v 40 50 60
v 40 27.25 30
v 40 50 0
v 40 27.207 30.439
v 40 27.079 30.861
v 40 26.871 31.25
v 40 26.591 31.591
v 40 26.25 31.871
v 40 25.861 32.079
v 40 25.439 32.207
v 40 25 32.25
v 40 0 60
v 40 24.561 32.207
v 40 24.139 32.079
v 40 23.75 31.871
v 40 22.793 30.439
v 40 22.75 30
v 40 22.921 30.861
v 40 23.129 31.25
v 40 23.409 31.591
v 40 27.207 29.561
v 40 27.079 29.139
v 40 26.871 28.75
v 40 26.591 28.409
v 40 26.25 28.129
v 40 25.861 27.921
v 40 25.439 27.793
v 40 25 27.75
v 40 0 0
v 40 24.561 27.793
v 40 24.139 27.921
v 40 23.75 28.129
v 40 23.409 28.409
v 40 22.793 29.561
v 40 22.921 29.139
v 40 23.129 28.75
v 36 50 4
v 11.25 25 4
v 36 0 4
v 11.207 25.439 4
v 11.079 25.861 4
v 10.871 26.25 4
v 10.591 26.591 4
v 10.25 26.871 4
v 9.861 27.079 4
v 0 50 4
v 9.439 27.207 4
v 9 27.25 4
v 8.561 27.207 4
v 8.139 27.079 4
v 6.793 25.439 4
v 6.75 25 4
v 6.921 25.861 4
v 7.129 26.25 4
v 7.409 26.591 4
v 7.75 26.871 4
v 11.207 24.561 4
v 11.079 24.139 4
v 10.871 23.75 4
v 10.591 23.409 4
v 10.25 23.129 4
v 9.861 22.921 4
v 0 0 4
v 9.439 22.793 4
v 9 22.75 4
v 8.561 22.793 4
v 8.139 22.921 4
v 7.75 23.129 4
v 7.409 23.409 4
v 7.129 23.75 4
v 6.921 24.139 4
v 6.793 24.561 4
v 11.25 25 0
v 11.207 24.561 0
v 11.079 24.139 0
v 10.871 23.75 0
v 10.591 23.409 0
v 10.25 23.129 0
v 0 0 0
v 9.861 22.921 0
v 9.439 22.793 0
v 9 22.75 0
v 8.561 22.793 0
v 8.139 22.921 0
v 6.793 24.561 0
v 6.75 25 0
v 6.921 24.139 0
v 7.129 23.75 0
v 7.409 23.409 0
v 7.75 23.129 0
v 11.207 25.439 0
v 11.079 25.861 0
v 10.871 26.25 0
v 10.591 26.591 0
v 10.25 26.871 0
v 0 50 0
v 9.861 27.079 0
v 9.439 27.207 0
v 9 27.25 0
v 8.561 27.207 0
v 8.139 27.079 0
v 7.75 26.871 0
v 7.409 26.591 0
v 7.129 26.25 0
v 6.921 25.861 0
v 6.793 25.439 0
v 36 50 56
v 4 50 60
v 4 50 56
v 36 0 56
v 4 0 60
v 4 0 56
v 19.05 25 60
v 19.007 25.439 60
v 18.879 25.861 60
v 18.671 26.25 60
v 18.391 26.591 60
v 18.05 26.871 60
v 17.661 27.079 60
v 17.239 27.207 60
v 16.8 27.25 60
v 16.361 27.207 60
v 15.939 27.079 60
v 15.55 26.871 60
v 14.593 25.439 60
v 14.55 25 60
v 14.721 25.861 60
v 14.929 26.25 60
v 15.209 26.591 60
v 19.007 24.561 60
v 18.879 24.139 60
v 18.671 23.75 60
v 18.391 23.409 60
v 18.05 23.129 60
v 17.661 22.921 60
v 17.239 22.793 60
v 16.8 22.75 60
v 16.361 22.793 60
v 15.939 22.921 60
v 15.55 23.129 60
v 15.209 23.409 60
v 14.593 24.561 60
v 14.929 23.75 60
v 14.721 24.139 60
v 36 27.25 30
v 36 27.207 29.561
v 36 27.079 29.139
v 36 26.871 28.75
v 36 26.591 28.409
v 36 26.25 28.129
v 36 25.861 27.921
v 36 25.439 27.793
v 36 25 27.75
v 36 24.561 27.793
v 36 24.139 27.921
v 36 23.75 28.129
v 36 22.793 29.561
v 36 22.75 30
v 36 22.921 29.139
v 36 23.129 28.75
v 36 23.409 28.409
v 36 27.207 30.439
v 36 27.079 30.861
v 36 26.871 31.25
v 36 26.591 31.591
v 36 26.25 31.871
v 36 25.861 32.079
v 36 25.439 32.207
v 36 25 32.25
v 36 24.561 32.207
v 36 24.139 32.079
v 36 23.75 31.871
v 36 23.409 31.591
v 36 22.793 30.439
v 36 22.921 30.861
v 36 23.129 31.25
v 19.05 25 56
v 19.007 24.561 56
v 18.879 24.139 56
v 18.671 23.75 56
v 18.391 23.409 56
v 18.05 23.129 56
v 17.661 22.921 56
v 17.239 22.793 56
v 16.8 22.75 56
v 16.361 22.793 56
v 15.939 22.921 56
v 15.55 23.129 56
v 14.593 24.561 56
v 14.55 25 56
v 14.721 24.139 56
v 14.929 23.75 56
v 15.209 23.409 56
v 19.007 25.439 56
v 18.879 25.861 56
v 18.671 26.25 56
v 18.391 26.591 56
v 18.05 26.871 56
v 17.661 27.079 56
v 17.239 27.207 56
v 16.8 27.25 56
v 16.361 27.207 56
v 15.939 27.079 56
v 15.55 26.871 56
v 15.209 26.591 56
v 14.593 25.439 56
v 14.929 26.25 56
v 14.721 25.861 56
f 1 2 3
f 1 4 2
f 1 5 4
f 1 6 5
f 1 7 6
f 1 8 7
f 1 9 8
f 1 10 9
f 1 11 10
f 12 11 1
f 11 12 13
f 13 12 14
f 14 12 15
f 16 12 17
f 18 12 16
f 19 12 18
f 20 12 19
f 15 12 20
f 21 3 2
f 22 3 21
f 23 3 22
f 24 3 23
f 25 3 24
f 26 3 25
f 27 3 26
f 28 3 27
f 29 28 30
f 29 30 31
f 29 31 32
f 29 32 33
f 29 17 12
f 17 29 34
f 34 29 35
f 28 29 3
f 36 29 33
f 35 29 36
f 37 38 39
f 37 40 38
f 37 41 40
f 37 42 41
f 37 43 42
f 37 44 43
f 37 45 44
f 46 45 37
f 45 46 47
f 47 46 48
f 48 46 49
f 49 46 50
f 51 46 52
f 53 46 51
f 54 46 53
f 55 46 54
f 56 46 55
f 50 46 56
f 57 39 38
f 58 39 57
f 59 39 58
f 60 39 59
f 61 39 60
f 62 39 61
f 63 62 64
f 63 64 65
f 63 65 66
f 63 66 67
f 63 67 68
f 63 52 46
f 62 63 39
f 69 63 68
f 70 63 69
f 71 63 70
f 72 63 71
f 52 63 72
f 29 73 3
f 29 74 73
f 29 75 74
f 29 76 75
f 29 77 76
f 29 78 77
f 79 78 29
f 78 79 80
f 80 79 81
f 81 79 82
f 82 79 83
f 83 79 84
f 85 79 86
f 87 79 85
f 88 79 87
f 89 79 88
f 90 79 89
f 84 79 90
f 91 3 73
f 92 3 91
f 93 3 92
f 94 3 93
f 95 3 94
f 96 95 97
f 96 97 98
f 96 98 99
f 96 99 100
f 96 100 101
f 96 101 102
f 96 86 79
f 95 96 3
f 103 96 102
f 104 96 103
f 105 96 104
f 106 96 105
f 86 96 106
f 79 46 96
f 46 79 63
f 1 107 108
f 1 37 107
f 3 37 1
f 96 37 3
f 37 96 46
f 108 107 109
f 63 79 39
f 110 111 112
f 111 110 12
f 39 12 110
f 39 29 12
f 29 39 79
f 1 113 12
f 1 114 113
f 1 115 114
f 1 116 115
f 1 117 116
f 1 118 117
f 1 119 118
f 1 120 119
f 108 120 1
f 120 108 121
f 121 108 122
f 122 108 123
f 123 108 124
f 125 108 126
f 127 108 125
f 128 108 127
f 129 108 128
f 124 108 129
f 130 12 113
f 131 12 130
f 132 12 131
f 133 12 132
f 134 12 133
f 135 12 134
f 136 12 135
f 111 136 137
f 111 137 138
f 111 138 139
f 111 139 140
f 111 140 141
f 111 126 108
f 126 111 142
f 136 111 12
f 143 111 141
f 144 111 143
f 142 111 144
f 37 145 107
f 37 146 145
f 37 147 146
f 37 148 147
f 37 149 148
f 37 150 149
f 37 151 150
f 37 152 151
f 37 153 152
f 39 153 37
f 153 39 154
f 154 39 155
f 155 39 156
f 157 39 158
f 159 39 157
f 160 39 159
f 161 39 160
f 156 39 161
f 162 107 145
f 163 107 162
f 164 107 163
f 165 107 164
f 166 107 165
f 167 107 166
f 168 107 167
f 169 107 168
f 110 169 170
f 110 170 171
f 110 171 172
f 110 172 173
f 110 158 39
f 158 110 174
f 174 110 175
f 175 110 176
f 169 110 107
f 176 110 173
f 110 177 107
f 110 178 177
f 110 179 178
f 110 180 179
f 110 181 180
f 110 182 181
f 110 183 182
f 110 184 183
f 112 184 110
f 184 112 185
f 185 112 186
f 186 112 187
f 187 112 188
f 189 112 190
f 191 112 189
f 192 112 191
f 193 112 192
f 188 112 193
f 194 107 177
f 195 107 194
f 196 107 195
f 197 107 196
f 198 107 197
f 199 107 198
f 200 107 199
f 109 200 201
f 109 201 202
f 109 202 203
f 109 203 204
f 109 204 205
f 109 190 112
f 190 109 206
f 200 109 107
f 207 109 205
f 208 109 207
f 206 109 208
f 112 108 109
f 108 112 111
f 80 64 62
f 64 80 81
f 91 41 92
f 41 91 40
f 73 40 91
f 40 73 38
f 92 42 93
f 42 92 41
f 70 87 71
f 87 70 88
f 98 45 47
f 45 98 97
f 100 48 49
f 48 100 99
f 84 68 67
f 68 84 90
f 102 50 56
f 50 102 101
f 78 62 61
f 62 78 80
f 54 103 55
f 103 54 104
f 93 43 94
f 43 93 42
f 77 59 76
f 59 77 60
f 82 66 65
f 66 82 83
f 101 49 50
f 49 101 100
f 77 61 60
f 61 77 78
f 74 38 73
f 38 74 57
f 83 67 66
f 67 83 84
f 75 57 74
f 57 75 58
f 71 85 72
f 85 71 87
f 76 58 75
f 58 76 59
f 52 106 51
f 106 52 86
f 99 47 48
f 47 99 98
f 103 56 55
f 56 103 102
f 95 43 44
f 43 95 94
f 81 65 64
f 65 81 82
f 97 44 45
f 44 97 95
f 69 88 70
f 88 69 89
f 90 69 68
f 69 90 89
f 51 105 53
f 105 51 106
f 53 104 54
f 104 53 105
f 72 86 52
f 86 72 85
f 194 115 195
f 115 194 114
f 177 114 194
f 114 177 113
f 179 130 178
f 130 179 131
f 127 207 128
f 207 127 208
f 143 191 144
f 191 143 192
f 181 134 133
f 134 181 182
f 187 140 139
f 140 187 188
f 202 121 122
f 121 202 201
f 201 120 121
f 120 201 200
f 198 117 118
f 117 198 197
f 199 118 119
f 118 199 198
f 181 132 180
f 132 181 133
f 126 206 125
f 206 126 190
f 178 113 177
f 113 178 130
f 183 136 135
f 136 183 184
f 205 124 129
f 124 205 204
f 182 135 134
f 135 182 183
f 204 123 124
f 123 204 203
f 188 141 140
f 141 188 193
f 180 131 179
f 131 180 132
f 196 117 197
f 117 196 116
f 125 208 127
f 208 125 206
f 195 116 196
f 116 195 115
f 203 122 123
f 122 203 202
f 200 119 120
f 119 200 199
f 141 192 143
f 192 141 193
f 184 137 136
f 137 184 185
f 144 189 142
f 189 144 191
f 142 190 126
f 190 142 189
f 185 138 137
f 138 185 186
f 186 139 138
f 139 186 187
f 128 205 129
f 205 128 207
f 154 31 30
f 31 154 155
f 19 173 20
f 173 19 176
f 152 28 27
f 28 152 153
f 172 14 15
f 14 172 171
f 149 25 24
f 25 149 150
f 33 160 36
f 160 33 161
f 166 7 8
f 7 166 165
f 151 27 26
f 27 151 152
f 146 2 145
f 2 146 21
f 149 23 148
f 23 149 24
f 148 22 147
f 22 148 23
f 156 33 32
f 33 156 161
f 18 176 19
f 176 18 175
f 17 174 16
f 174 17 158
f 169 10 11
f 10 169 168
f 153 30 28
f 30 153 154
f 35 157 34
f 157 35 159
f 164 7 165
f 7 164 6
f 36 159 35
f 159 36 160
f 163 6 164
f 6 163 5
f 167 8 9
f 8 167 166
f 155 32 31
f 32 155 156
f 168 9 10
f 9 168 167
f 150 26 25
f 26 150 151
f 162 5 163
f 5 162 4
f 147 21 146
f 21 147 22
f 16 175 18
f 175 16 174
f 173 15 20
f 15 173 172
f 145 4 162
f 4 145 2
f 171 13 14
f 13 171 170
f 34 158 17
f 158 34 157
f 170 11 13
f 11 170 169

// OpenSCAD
$fn = 32;

// ----------------------------------------------------------------------
// Z-bracket: 40 x 50 x 60 mm
// ----------------------------------------------------------------------

// --- parameters (mm) ---
foot_len = 40;            // lower foot length, X
top_len = 32;             // upper foot length, X
depth = 50;               // bracket width, Y
step_h = 60;              // overall rise, Z
plate_t = 4;              // plate thickness
hole_d = 4.5;             // clearance for M4

module hole_z(px, py, z0) {
  translate([px, py, z0 - 2.5]) cylinder(h = plate_t + 5, d = hole_d);
}
module hole_x(py, pz) {
  translate([-2.5, py, pz]) rotate([0, 90, 0]) cylinder(h = plate_t + 5, d = hole_d);
}

difference() {
  union() {
    cube([foot_len, depth, plate_t]);
    /* web, overlapping the lower foot */
    translate([foot_len - plate_t, 0, 0]) cube([plate_t, depth, step_h]);
    /* upper foot, sunk into the web */
    translate([foot_len - plate_t - top_len, 0, step_h - plate_t]) cube([top_len + plate_t, depth, plate_t]);
  }
  hole_z(9, 25, 0);
  translate([foot_len - plate_t - 19.2, 0, 0]) hole_z(0, 25, step_h - plate_t);
  translate([foot_len - plate_t, 0, 0]) hole_x(25, 30);
}
